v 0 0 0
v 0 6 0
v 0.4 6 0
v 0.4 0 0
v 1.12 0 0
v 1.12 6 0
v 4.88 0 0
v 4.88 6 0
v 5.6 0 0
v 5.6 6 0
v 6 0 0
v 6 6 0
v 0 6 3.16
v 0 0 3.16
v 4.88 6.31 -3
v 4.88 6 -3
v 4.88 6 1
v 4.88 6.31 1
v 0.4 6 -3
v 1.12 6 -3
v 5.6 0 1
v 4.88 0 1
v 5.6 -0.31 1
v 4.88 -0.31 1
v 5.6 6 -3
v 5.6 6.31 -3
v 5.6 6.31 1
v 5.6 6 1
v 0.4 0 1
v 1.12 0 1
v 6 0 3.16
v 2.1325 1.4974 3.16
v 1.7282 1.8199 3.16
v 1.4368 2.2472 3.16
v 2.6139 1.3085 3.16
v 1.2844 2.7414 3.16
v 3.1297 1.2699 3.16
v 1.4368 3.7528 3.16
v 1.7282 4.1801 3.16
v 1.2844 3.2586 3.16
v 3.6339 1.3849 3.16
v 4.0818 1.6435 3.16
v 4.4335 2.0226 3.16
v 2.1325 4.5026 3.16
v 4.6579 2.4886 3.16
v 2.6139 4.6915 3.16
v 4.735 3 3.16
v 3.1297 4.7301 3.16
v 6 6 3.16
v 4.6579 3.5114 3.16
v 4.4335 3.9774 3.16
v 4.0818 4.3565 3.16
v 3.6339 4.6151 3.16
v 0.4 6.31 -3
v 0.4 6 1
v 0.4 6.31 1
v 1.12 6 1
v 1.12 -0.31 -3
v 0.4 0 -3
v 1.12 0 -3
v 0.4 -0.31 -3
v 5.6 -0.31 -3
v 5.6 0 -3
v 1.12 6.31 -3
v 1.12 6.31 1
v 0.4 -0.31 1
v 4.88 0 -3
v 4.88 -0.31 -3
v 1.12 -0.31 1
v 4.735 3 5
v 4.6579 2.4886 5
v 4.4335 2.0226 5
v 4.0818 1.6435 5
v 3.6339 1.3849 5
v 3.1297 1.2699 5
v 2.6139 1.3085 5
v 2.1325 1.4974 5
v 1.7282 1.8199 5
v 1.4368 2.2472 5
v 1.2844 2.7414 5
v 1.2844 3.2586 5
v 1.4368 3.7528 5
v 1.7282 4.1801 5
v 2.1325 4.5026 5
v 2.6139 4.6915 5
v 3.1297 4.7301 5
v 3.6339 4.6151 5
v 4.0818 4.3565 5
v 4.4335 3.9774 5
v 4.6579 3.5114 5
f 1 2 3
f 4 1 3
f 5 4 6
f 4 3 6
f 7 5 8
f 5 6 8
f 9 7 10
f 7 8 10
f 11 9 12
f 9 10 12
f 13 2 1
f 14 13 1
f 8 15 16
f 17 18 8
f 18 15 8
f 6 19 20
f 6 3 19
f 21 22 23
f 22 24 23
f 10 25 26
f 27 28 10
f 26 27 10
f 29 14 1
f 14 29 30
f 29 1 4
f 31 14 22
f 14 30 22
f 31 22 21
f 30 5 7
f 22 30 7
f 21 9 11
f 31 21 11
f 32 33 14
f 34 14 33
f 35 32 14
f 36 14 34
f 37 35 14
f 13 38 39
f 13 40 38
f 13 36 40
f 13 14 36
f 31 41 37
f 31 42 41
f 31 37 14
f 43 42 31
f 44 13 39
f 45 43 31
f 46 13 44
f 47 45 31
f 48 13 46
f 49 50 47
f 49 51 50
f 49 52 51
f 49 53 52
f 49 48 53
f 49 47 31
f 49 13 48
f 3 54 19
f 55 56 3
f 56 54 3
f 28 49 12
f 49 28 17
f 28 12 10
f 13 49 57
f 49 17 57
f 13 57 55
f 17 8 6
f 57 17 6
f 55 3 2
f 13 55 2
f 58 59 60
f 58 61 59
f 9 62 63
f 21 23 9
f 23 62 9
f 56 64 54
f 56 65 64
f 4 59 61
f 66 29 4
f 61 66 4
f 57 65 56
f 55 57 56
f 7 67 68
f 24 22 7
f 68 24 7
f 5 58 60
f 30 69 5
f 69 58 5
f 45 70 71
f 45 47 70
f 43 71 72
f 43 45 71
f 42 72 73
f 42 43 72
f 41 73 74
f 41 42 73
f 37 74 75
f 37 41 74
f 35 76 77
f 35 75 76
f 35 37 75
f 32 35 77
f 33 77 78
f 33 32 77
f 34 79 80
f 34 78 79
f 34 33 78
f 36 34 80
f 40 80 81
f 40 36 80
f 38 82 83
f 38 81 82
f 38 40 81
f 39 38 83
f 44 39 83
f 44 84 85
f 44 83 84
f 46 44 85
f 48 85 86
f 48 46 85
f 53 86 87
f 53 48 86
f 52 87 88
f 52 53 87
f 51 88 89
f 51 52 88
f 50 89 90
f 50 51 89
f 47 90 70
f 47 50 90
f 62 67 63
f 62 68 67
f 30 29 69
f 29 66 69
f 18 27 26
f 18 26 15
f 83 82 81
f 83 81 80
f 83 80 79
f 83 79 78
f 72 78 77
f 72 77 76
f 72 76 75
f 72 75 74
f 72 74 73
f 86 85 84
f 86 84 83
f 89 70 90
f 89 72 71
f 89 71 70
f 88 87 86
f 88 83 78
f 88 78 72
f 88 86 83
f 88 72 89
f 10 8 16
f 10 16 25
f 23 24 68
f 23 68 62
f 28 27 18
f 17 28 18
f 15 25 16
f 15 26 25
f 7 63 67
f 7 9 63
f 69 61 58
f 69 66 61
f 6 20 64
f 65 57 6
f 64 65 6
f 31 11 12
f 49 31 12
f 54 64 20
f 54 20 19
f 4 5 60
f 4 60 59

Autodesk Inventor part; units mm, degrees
ref_plane "YZ Plane" through (0, 0, 0) normal (1, 0, 0) x (0, 1, 0)
sketch "Sketch1" plane through (0, 0, 0) normal (0, 0, 1) x (1, 0, 0)
  line L0 (0, 0) -> (6, 0)
  line L1 (6, 0) -> (6, 6)
  line L2 (6, 6) -> (0, 6)
  line L3 (0, 6) -> (0, 0)
  dimension "d0" = 6
  dimension "d1" = 6
extrude "Extrusion1" add sketch "Sketch1" along normal blind 3.16
sketch "Sketch2" plane through (0, 0, 3.16) normal (0, 0, 1) x (1, 0, 0)
  circle A0 centre (3, 3) radius 1.735
  line L0 (6, 0) -> (6, 6) projected
  line L1 (6, 6) -> (0, 6) projected
  point P0 (0, 0)
  point P1 (6, 3)
  point P2 (3, 6)
  dimension "d4" = 3.47
extrude "Extrusion2" add sketch "Sketch2" along normal blind 1.84
sketch "Sketch3" plane through (0, 0, 0) normal (0, 0, -1) x (-1, 0, 0)
  line L0 (-5.6, 6.31) -> (-4.88, 6.31)
  line L1 (-4.88, 6.31) -> (-4.88, 6)
  line L2 (-4.88, 6) -> (-5.6, 6)
  line L3 (-5.6, 6) -> (-5.6, 6.31)
  line L4 (-6, 6) -> (0, 6) projected
  line L5 (-6, 0) -> (-6, 6) projected
  point P0 (0, 0)
  dimension "d7" = 0.72
  dimension "d8" = 0.31
  dimension "d9" = 0.4
extrude "Extrusion3" add sketch "Sketch3" along normal blind 3 and the other way blind 1
ref_plane "Work Plane1" through (3, 0, 0) normal (1, 0, 0) x (0, 0, -1)
ref_plane "Work Plane2" through (0, 3, 0) normal (0, -1, 0) x (1, 0, 0)
mirror "Mirror3" about plane through (3, 0, 0) normal (1, 0, 0) of "Extrusion3"
mirror "Mirror4" about plane through (0, 3, 0) normal (0, -1, 0) of "Extrusion3", "Mirror3"
properties part number "Button"
